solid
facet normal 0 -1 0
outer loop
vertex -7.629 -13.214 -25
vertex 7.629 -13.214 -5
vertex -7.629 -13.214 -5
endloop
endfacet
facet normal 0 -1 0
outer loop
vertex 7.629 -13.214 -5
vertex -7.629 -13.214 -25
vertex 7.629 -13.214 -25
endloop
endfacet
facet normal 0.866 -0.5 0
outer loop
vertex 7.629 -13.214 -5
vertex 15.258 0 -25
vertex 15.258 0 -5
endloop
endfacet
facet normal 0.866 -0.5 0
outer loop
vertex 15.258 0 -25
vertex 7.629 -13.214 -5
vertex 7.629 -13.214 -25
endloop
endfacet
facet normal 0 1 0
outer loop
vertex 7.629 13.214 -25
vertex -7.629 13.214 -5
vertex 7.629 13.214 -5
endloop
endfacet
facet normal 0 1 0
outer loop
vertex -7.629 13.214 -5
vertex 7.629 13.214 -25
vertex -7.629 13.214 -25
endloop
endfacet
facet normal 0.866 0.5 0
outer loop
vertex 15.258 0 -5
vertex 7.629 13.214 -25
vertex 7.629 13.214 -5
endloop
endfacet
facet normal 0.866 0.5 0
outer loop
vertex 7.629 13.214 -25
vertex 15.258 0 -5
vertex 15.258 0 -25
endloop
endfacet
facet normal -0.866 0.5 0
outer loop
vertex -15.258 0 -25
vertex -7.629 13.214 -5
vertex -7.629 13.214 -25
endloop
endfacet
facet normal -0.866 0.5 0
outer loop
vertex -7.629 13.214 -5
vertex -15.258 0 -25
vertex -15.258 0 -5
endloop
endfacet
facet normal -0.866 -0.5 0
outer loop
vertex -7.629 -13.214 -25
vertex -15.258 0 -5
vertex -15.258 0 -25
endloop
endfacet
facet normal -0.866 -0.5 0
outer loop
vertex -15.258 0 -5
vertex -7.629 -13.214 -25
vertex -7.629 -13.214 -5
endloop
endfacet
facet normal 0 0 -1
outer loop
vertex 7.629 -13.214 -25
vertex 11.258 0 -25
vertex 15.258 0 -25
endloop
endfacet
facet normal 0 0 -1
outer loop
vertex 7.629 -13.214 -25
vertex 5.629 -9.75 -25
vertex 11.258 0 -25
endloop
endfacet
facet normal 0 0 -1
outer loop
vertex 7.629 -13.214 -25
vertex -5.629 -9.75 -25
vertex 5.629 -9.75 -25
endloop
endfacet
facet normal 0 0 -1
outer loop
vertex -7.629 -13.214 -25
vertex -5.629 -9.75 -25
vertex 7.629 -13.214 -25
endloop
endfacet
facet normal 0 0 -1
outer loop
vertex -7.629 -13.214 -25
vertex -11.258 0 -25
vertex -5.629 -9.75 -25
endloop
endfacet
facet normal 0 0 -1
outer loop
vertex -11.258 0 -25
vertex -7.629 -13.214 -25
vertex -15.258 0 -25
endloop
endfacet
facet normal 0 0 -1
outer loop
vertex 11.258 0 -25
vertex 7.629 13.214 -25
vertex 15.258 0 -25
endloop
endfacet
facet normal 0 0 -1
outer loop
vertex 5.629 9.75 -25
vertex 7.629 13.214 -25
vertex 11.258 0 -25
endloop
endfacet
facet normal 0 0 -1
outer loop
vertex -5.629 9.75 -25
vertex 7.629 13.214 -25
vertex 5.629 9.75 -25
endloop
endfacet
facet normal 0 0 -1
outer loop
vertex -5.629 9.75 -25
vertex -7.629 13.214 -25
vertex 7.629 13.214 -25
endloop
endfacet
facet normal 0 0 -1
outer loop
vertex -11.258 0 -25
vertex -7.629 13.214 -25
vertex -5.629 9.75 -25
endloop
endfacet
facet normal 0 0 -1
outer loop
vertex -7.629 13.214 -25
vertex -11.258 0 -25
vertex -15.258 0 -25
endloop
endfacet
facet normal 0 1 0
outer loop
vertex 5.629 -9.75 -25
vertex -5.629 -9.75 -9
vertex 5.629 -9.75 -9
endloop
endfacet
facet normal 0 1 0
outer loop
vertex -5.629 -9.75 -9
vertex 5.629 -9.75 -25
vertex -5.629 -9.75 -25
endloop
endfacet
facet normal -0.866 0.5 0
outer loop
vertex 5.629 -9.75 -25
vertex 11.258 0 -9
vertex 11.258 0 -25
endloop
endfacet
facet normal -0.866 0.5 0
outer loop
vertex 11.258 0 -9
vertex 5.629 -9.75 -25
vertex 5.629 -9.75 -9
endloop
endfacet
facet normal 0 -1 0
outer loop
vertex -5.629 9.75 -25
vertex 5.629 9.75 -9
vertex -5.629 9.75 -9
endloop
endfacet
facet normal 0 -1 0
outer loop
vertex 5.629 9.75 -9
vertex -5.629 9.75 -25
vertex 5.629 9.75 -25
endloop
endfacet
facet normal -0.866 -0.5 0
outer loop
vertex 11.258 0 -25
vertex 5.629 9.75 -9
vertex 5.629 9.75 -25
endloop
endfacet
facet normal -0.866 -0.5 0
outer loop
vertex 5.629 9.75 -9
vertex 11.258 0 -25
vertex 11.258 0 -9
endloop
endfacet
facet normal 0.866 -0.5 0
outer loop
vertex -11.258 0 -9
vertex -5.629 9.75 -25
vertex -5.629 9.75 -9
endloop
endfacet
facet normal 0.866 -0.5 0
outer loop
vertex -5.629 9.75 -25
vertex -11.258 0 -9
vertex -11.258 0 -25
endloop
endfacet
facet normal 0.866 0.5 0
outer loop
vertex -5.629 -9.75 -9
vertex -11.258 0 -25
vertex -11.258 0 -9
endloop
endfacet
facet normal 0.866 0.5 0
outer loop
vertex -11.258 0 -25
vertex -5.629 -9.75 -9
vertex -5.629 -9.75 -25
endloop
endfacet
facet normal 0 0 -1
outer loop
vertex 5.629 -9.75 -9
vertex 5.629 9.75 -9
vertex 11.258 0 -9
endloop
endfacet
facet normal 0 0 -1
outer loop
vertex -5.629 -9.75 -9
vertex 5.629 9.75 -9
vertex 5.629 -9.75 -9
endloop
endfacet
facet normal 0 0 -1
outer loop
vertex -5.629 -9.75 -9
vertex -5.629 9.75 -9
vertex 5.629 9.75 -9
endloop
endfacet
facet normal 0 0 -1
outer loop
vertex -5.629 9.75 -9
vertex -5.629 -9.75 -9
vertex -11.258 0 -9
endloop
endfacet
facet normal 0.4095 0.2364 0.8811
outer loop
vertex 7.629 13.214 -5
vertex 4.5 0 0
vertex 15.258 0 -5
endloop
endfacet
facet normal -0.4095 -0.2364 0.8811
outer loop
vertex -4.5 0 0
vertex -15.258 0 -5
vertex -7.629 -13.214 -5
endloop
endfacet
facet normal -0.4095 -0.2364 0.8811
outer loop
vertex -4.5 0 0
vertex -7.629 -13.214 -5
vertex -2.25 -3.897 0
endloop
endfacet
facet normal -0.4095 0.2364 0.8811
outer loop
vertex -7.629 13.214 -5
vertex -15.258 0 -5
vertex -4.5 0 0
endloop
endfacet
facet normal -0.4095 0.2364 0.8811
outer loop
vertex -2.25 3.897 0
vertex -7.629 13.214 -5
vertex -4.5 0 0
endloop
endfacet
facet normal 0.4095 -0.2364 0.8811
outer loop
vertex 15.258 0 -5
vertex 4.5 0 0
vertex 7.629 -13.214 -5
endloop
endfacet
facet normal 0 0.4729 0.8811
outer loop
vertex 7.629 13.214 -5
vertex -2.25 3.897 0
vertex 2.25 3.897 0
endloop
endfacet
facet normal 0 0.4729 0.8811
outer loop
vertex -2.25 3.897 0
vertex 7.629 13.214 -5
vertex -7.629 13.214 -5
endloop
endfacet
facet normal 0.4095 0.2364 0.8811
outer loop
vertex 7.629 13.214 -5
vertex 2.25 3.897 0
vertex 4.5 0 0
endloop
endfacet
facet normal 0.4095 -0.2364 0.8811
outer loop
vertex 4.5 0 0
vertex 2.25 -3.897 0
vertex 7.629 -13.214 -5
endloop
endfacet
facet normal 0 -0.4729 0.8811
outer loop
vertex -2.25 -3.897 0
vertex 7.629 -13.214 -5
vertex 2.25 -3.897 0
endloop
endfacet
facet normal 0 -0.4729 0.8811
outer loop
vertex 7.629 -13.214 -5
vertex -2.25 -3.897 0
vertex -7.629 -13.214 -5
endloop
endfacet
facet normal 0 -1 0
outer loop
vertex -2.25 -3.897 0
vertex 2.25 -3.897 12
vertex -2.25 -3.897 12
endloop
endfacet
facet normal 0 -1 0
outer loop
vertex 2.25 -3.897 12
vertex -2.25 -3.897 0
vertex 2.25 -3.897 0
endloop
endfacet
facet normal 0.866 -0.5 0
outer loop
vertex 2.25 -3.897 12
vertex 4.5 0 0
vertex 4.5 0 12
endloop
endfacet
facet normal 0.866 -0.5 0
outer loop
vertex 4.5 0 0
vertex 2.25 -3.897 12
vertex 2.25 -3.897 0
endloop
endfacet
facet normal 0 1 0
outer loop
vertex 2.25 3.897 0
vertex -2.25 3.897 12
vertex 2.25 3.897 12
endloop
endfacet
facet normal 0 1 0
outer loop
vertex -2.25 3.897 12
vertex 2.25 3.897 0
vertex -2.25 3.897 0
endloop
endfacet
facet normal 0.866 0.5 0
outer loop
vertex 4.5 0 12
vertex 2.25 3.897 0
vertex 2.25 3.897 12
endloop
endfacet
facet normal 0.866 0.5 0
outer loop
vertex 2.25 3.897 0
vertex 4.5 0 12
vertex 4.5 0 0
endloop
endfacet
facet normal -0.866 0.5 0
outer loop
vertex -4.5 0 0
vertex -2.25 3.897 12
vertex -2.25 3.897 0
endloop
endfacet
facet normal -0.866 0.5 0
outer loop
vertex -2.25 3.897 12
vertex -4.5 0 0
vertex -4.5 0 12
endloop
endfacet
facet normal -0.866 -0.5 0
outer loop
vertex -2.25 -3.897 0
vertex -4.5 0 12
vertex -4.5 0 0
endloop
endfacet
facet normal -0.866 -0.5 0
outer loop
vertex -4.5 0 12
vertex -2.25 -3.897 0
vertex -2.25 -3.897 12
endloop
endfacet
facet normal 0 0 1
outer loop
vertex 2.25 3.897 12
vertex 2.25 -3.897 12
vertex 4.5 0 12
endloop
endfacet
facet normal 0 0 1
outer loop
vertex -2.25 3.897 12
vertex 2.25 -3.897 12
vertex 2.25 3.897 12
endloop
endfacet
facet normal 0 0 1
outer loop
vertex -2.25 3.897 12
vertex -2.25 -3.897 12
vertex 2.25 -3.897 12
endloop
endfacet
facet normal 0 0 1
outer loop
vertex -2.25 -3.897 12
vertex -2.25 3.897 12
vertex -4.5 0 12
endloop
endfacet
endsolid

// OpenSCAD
S=19.5;

R=(S/2)/cos(360/6/2);
L=20;
W=4;

DRIVER_D=9;
DRIVER_L=12;
INC_L=5;



cylinder($fn=6,d=DRIVER_D,h=DRIVER_L);
translate([0,0,-INC_L]){
cylinder($fn=6,r1=R+W,h=INC_L,d2=DRIVER_D);
translate([0,0,-L/2])
difference() {
    cylinder($fn=6,r=R+W,h=L,center=true);
    translate([0,0,-W])
    cylinder($fn=6,r=R,h=L,center=true);
}
}
